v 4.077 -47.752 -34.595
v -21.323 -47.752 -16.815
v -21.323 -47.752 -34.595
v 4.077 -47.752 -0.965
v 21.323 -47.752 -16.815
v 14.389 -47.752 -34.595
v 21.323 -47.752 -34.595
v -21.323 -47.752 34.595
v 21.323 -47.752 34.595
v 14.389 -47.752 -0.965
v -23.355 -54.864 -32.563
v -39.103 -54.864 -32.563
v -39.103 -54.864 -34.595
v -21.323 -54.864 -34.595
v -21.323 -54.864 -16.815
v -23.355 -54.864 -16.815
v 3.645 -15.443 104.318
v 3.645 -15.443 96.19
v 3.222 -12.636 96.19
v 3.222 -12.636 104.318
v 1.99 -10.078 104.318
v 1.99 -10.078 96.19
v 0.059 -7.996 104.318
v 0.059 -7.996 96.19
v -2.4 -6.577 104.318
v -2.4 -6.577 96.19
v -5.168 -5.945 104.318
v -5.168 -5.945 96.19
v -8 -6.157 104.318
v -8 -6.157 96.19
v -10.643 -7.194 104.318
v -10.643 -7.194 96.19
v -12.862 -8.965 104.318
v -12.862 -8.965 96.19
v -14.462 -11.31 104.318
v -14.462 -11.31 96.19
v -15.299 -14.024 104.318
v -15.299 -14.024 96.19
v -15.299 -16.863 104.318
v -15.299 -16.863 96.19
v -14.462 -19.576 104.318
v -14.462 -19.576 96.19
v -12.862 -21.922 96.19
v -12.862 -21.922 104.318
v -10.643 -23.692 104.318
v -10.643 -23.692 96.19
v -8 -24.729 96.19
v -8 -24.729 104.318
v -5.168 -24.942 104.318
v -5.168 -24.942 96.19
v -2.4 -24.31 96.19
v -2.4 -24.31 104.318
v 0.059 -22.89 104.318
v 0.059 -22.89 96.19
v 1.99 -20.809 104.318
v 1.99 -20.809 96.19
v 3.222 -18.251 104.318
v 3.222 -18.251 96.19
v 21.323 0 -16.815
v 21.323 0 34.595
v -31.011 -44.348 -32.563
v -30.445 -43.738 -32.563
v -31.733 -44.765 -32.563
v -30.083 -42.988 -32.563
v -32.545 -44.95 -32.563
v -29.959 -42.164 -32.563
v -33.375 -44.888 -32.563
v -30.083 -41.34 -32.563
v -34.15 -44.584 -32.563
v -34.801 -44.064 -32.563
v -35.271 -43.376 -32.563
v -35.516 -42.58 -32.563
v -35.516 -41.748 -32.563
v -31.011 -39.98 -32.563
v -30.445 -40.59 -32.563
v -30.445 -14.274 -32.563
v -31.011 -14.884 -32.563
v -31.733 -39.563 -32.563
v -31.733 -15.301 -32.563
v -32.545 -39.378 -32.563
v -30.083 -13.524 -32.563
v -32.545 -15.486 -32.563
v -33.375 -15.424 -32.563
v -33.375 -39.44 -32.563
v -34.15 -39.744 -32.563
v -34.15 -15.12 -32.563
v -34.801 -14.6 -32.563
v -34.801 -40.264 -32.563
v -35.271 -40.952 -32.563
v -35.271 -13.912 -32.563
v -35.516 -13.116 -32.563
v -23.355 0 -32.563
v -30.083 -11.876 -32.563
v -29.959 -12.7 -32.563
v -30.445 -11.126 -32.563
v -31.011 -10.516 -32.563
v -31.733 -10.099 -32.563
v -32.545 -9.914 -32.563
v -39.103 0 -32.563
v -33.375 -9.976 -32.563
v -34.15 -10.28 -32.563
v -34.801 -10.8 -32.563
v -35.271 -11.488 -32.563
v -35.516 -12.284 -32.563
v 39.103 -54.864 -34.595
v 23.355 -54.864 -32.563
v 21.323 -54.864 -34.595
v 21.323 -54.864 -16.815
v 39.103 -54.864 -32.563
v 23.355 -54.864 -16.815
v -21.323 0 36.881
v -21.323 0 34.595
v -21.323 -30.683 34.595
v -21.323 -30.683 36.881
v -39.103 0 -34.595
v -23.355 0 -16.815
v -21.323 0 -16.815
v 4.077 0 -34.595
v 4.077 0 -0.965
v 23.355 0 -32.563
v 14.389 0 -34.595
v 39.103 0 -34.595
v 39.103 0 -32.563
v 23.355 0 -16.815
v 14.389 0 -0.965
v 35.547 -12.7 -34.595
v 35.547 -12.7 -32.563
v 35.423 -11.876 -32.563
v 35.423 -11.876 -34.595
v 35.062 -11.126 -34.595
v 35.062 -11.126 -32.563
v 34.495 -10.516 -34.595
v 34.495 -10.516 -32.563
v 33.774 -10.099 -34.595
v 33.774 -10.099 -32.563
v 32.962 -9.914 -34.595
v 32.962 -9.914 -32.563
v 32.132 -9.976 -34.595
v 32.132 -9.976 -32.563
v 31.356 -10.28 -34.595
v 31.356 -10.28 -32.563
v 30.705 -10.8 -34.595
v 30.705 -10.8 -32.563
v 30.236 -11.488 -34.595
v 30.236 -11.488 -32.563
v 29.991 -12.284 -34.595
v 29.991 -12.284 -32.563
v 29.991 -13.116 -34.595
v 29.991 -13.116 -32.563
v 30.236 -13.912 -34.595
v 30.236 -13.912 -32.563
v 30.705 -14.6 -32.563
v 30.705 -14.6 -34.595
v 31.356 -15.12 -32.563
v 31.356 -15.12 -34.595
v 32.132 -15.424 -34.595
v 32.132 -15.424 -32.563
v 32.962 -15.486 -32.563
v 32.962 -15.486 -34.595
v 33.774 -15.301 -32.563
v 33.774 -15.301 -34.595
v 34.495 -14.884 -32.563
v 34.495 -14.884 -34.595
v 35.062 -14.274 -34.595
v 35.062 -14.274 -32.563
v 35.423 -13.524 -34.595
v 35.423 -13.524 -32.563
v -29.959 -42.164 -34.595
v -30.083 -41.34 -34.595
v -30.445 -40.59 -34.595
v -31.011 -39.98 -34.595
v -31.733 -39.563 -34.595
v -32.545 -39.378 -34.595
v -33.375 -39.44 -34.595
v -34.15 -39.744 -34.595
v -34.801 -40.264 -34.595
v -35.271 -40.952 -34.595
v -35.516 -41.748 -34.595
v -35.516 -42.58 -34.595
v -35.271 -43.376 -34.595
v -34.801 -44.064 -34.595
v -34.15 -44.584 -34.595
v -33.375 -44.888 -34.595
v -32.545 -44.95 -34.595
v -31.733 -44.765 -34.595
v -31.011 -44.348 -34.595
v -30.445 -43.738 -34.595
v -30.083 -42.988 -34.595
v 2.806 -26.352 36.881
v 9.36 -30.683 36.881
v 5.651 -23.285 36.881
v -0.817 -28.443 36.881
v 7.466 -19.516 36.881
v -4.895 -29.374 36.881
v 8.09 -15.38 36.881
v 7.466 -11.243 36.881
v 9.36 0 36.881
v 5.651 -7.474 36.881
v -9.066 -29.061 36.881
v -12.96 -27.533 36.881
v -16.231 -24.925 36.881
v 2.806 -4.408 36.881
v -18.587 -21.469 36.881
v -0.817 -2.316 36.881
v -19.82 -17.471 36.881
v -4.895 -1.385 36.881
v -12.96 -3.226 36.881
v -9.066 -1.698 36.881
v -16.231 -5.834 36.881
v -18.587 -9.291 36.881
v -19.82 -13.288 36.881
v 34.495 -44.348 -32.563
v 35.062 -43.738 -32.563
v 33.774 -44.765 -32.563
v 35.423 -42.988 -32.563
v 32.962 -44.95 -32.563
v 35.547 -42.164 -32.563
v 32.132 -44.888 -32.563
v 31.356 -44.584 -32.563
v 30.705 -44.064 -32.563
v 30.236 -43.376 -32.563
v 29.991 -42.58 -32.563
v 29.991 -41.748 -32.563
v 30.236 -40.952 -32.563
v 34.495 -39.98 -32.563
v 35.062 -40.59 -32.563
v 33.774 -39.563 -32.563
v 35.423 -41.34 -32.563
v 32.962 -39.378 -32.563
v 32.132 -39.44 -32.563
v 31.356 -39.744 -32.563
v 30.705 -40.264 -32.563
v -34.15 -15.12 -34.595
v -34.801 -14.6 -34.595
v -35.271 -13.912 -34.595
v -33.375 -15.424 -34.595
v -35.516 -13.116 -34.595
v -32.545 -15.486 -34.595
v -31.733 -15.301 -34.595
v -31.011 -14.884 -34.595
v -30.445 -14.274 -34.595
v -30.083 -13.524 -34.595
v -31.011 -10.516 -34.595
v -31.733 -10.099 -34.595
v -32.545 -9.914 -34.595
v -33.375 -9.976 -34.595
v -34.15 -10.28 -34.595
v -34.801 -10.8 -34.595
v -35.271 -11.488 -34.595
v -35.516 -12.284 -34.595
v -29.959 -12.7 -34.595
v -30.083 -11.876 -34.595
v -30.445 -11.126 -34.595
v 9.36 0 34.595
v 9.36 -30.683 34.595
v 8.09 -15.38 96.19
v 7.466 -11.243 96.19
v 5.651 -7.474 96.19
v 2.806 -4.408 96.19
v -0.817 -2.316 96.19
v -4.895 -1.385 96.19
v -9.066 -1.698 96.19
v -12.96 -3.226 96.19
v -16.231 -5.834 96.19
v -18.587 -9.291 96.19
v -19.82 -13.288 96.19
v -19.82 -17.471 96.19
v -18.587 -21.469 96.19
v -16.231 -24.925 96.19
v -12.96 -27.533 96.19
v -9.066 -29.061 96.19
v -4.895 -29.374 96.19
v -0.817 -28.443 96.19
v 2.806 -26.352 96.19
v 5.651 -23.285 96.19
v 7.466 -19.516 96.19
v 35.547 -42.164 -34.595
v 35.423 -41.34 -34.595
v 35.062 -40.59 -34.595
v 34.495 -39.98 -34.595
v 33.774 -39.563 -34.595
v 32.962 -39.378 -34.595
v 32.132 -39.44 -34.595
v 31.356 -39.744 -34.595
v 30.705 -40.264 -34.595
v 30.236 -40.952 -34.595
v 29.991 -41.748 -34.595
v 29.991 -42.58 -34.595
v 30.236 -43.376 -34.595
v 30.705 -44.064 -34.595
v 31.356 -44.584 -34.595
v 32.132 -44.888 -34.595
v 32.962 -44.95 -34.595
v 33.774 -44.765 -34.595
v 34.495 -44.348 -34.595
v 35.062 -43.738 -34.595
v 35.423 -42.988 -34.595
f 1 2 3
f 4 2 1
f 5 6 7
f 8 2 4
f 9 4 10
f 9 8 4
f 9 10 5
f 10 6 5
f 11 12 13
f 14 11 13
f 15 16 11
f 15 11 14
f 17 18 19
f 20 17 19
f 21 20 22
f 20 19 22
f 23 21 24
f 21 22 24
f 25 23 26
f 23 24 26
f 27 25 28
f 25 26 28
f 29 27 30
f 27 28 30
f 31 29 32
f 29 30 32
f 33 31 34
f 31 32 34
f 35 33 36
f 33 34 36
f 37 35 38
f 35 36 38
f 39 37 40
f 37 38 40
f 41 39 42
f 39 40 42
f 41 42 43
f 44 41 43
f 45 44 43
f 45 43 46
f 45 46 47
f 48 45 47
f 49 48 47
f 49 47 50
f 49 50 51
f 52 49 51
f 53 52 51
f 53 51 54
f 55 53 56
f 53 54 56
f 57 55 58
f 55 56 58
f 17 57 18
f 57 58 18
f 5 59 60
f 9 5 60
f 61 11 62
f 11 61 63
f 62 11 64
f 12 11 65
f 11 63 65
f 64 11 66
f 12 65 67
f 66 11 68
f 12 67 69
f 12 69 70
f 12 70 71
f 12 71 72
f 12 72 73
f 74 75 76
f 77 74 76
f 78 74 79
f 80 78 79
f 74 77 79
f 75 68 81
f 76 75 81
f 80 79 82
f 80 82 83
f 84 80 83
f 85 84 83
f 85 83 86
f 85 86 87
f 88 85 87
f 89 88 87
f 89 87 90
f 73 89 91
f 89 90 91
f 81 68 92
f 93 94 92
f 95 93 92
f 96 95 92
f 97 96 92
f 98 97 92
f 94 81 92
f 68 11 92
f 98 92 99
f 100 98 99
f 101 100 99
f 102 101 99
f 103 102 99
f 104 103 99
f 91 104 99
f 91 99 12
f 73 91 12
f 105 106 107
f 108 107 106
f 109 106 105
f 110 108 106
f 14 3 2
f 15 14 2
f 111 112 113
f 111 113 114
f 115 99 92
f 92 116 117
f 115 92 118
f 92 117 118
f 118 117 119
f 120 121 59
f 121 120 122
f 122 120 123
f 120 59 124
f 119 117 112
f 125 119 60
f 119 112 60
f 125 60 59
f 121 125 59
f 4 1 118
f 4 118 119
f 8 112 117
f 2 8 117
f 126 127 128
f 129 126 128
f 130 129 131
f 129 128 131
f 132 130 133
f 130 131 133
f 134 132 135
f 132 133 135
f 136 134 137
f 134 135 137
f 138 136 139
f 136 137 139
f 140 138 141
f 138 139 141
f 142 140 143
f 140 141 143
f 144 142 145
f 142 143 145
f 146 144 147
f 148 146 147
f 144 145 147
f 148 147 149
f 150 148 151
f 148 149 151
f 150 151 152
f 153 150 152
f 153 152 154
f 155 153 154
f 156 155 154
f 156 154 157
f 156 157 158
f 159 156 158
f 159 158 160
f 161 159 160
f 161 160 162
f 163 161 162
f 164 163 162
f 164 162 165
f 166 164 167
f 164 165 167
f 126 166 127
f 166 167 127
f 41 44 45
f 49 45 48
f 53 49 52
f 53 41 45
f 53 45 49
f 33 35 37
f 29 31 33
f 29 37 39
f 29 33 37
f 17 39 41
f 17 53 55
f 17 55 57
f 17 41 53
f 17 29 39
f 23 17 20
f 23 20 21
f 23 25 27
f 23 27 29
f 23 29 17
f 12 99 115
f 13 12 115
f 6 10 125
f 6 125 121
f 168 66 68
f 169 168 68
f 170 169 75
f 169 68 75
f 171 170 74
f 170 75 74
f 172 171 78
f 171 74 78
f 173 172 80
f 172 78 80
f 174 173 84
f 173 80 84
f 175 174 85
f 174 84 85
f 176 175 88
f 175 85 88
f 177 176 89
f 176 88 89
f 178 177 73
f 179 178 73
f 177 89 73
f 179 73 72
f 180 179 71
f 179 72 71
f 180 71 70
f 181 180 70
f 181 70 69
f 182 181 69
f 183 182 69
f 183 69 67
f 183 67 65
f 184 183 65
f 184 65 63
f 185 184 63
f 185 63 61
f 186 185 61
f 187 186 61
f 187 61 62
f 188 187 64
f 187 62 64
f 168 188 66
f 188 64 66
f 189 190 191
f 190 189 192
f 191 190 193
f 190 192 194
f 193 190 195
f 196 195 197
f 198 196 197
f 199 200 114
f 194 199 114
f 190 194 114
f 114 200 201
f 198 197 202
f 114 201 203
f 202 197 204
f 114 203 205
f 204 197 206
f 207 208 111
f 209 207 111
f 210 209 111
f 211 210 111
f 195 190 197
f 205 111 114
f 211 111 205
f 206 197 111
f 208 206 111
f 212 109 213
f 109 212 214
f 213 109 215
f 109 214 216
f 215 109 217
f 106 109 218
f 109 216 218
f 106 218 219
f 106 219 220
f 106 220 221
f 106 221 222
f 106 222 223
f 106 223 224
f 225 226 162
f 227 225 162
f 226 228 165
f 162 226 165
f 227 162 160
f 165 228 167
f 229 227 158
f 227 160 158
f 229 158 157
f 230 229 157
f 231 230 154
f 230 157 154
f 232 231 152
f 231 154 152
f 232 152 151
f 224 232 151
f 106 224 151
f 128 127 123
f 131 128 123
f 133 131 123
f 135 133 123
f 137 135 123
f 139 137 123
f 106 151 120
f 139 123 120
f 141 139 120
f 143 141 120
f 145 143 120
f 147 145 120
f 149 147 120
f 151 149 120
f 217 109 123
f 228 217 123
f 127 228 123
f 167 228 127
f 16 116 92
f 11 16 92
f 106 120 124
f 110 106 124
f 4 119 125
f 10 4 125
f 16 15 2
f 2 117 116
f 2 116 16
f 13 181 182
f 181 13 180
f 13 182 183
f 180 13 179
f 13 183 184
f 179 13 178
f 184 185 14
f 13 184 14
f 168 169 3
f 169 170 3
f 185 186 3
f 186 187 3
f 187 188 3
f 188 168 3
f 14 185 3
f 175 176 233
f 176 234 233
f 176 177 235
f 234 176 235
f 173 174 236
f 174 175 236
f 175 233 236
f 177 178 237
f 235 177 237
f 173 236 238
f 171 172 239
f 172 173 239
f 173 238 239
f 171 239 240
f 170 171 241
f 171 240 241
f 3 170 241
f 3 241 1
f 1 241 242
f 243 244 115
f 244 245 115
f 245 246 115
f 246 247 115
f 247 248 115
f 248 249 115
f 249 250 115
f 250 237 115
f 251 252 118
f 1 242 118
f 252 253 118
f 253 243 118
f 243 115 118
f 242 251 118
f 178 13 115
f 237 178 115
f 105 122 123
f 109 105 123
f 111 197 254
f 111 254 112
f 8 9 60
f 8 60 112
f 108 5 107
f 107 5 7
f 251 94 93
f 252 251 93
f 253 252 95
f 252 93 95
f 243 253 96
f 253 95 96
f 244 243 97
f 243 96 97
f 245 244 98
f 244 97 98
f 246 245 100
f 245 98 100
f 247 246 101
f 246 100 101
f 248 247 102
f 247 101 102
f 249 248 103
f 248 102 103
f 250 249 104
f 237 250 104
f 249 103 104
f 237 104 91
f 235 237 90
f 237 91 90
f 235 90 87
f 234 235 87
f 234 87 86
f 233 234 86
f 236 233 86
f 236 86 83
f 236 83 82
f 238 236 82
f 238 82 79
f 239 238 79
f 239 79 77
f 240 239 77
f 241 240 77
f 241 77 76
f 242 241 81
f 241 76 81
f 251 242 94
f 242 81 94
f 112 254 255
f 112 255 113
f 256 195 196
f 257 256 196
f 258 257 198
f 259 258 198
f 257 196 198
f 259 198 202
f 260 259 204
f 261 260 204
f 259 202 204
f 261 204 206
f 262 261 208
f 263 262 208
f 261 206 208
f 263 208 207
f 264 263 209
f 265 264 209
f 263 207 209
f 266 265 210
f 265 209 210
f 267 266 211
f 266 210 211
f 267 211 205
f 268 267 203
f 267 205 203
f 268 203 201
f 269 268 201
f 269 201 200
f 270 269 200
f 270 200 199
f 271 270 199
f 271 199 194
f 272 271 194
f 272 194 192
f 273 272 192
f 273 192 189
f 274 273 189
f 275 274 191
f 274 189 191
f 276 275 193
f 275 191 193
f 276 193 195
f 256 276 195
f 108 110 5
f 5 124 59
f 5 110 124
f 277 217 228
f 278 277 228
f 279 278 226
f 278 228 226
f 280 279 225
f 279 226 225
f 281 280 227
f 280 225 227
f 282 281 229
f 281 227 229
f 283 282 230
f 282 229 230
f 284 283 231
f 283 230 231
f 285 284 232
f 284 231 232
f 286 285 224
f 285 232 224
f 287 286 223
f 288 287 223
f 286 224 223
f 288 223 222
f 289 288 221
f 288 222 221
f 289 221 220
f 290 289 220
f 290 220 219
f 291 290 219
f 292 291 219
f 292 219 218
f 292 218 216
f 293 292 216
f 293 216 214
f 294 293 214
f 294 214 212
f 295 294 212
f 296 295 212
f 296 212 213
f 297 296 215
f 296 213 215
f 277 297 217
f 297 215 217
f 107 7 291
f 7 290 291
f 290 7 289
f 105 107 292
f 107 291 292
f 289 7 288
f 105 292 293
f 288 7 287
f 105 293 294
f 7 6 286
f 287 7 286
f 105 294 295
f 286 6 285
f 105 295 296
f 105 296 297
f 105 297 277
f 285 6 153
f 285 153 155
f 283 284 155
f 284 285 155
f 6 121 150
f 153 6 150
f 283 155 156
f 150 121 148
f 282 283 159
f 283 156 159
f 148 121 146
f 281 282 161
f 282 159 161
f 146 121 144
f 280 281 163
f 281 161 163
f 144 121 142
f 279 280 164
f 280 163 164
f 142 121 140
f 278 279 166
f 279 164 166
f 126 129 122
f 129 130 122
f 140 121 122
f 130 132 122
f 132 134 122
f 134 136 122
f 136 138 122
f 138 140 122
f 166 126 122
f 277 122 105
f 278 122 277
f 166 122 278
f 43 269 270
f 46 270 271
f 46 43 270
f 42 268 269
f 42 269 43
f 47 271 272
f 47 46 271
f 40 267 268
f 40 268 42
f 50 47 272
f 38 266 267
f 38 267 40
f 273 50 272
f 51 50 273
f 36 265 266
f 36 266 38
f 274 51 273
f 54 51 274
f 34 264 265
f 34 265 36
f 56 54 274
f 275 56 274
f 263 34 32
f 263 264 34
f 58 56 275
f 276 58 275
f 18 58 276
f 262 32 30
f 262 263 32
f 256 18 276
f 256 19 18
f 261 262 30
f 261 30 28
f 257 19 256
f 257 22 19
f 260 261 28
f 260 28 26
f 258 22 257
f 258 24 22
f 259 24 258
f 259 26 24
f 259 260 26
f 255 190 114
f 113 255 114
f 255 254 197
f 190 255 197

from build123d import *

# Parameters (mm, degrees)
F1_DEPTH  = 47.752
F2_W      = 30.6832
F2_H      = 2.286
F3_DEPTH  = 30.6832
F4_R      = 14.0335
F5_DEPTH  = 59.309
F6_R      = 9.525
F7_DEPTH  = 8.128
F9_DEPTH  = 54.864
F10_R     = 2.794
F11_DEPTH = 2.032


with BuildPart() as f1:
    # F0 (on Front) → F1 (new body)
    with BuildSketch(Plane.XZ):
        Polygon((21.3233, 34.5948), (-21.3233, 34.5948), (-21.3233, -34.5948), (4.0767, -34.5948), (4.0767, -0.964703), (14.3891, -0.964703), (14.3891, -34.5948), (21.3233, -34.5948), align=None)
    extrude(amount=F1_DEPTH)

    # F8 (on Front) → F9 (join)
    with BuildSketch(Plane.XZ):
        Polygon((21.3233, -16.8148), (21.3233, -34.5948), (39.1033, -34.5948), (39.1033, -32.5628), (23.3553, -32.5628), (23.3553, -16.8148), align=None)
        Polygon((-39.1033, -34.5948), (-21.3233, -34.5948), (-21.3233, -16.8148), (-23.3553, -16.8148), (-23.3553, -32.5628), (-39.1033, -32.5628), align=None)
    extrude(amount=F9_DEPTH)

    # F10 (on face) → F11 (cut)
    with BuildSketch(Plane.XY.offset(-32.5628)):
        with Locations((32.7533, -42.164)):
            Circle(F10_R)
        with Locations((32.7533, -12.7)):
            Circle(F10_R)
        with Locations((-32.7533, -12.7)):
            Circle(F10_R)
        with Locations((-32.7533, -42.164)):
            Circle(F10_R)
    extrude(amount=-F11_DEPTH, mode=Mode.SUBTRACT)


with BuildPart() as f3:
    # F2 (on face) → F3 (new body)
    with BuildSketch(Plane(origin=(0, 0, 0), x_dir=(-1, 0, 0), z_dir=(0, 1, 0))):
        with Locations((5.9817, 35.7378)):
            Rectangle(F2_W, F2_H)
    extrude(amount=-F3_DEPTH)

    # F4 (on face) → F5 (join)
    with BuildSketch(Plane.XY.offset(36.8808)):
        with Locations((-5.9436, -15.3797)):
            Circle(F4_R)
    extrude(amount=F5_DEPTH)

    # F6 (on face) → F7 (join)
    with BuildSketch(Plane.XY.offset(96.1898)):
        with Locations((-5.8801, -15.4432)):
            Circle(F6_R)
    extrude(amount=F7_DEPTH)


solid = Compound([f1.part, f3.part])
